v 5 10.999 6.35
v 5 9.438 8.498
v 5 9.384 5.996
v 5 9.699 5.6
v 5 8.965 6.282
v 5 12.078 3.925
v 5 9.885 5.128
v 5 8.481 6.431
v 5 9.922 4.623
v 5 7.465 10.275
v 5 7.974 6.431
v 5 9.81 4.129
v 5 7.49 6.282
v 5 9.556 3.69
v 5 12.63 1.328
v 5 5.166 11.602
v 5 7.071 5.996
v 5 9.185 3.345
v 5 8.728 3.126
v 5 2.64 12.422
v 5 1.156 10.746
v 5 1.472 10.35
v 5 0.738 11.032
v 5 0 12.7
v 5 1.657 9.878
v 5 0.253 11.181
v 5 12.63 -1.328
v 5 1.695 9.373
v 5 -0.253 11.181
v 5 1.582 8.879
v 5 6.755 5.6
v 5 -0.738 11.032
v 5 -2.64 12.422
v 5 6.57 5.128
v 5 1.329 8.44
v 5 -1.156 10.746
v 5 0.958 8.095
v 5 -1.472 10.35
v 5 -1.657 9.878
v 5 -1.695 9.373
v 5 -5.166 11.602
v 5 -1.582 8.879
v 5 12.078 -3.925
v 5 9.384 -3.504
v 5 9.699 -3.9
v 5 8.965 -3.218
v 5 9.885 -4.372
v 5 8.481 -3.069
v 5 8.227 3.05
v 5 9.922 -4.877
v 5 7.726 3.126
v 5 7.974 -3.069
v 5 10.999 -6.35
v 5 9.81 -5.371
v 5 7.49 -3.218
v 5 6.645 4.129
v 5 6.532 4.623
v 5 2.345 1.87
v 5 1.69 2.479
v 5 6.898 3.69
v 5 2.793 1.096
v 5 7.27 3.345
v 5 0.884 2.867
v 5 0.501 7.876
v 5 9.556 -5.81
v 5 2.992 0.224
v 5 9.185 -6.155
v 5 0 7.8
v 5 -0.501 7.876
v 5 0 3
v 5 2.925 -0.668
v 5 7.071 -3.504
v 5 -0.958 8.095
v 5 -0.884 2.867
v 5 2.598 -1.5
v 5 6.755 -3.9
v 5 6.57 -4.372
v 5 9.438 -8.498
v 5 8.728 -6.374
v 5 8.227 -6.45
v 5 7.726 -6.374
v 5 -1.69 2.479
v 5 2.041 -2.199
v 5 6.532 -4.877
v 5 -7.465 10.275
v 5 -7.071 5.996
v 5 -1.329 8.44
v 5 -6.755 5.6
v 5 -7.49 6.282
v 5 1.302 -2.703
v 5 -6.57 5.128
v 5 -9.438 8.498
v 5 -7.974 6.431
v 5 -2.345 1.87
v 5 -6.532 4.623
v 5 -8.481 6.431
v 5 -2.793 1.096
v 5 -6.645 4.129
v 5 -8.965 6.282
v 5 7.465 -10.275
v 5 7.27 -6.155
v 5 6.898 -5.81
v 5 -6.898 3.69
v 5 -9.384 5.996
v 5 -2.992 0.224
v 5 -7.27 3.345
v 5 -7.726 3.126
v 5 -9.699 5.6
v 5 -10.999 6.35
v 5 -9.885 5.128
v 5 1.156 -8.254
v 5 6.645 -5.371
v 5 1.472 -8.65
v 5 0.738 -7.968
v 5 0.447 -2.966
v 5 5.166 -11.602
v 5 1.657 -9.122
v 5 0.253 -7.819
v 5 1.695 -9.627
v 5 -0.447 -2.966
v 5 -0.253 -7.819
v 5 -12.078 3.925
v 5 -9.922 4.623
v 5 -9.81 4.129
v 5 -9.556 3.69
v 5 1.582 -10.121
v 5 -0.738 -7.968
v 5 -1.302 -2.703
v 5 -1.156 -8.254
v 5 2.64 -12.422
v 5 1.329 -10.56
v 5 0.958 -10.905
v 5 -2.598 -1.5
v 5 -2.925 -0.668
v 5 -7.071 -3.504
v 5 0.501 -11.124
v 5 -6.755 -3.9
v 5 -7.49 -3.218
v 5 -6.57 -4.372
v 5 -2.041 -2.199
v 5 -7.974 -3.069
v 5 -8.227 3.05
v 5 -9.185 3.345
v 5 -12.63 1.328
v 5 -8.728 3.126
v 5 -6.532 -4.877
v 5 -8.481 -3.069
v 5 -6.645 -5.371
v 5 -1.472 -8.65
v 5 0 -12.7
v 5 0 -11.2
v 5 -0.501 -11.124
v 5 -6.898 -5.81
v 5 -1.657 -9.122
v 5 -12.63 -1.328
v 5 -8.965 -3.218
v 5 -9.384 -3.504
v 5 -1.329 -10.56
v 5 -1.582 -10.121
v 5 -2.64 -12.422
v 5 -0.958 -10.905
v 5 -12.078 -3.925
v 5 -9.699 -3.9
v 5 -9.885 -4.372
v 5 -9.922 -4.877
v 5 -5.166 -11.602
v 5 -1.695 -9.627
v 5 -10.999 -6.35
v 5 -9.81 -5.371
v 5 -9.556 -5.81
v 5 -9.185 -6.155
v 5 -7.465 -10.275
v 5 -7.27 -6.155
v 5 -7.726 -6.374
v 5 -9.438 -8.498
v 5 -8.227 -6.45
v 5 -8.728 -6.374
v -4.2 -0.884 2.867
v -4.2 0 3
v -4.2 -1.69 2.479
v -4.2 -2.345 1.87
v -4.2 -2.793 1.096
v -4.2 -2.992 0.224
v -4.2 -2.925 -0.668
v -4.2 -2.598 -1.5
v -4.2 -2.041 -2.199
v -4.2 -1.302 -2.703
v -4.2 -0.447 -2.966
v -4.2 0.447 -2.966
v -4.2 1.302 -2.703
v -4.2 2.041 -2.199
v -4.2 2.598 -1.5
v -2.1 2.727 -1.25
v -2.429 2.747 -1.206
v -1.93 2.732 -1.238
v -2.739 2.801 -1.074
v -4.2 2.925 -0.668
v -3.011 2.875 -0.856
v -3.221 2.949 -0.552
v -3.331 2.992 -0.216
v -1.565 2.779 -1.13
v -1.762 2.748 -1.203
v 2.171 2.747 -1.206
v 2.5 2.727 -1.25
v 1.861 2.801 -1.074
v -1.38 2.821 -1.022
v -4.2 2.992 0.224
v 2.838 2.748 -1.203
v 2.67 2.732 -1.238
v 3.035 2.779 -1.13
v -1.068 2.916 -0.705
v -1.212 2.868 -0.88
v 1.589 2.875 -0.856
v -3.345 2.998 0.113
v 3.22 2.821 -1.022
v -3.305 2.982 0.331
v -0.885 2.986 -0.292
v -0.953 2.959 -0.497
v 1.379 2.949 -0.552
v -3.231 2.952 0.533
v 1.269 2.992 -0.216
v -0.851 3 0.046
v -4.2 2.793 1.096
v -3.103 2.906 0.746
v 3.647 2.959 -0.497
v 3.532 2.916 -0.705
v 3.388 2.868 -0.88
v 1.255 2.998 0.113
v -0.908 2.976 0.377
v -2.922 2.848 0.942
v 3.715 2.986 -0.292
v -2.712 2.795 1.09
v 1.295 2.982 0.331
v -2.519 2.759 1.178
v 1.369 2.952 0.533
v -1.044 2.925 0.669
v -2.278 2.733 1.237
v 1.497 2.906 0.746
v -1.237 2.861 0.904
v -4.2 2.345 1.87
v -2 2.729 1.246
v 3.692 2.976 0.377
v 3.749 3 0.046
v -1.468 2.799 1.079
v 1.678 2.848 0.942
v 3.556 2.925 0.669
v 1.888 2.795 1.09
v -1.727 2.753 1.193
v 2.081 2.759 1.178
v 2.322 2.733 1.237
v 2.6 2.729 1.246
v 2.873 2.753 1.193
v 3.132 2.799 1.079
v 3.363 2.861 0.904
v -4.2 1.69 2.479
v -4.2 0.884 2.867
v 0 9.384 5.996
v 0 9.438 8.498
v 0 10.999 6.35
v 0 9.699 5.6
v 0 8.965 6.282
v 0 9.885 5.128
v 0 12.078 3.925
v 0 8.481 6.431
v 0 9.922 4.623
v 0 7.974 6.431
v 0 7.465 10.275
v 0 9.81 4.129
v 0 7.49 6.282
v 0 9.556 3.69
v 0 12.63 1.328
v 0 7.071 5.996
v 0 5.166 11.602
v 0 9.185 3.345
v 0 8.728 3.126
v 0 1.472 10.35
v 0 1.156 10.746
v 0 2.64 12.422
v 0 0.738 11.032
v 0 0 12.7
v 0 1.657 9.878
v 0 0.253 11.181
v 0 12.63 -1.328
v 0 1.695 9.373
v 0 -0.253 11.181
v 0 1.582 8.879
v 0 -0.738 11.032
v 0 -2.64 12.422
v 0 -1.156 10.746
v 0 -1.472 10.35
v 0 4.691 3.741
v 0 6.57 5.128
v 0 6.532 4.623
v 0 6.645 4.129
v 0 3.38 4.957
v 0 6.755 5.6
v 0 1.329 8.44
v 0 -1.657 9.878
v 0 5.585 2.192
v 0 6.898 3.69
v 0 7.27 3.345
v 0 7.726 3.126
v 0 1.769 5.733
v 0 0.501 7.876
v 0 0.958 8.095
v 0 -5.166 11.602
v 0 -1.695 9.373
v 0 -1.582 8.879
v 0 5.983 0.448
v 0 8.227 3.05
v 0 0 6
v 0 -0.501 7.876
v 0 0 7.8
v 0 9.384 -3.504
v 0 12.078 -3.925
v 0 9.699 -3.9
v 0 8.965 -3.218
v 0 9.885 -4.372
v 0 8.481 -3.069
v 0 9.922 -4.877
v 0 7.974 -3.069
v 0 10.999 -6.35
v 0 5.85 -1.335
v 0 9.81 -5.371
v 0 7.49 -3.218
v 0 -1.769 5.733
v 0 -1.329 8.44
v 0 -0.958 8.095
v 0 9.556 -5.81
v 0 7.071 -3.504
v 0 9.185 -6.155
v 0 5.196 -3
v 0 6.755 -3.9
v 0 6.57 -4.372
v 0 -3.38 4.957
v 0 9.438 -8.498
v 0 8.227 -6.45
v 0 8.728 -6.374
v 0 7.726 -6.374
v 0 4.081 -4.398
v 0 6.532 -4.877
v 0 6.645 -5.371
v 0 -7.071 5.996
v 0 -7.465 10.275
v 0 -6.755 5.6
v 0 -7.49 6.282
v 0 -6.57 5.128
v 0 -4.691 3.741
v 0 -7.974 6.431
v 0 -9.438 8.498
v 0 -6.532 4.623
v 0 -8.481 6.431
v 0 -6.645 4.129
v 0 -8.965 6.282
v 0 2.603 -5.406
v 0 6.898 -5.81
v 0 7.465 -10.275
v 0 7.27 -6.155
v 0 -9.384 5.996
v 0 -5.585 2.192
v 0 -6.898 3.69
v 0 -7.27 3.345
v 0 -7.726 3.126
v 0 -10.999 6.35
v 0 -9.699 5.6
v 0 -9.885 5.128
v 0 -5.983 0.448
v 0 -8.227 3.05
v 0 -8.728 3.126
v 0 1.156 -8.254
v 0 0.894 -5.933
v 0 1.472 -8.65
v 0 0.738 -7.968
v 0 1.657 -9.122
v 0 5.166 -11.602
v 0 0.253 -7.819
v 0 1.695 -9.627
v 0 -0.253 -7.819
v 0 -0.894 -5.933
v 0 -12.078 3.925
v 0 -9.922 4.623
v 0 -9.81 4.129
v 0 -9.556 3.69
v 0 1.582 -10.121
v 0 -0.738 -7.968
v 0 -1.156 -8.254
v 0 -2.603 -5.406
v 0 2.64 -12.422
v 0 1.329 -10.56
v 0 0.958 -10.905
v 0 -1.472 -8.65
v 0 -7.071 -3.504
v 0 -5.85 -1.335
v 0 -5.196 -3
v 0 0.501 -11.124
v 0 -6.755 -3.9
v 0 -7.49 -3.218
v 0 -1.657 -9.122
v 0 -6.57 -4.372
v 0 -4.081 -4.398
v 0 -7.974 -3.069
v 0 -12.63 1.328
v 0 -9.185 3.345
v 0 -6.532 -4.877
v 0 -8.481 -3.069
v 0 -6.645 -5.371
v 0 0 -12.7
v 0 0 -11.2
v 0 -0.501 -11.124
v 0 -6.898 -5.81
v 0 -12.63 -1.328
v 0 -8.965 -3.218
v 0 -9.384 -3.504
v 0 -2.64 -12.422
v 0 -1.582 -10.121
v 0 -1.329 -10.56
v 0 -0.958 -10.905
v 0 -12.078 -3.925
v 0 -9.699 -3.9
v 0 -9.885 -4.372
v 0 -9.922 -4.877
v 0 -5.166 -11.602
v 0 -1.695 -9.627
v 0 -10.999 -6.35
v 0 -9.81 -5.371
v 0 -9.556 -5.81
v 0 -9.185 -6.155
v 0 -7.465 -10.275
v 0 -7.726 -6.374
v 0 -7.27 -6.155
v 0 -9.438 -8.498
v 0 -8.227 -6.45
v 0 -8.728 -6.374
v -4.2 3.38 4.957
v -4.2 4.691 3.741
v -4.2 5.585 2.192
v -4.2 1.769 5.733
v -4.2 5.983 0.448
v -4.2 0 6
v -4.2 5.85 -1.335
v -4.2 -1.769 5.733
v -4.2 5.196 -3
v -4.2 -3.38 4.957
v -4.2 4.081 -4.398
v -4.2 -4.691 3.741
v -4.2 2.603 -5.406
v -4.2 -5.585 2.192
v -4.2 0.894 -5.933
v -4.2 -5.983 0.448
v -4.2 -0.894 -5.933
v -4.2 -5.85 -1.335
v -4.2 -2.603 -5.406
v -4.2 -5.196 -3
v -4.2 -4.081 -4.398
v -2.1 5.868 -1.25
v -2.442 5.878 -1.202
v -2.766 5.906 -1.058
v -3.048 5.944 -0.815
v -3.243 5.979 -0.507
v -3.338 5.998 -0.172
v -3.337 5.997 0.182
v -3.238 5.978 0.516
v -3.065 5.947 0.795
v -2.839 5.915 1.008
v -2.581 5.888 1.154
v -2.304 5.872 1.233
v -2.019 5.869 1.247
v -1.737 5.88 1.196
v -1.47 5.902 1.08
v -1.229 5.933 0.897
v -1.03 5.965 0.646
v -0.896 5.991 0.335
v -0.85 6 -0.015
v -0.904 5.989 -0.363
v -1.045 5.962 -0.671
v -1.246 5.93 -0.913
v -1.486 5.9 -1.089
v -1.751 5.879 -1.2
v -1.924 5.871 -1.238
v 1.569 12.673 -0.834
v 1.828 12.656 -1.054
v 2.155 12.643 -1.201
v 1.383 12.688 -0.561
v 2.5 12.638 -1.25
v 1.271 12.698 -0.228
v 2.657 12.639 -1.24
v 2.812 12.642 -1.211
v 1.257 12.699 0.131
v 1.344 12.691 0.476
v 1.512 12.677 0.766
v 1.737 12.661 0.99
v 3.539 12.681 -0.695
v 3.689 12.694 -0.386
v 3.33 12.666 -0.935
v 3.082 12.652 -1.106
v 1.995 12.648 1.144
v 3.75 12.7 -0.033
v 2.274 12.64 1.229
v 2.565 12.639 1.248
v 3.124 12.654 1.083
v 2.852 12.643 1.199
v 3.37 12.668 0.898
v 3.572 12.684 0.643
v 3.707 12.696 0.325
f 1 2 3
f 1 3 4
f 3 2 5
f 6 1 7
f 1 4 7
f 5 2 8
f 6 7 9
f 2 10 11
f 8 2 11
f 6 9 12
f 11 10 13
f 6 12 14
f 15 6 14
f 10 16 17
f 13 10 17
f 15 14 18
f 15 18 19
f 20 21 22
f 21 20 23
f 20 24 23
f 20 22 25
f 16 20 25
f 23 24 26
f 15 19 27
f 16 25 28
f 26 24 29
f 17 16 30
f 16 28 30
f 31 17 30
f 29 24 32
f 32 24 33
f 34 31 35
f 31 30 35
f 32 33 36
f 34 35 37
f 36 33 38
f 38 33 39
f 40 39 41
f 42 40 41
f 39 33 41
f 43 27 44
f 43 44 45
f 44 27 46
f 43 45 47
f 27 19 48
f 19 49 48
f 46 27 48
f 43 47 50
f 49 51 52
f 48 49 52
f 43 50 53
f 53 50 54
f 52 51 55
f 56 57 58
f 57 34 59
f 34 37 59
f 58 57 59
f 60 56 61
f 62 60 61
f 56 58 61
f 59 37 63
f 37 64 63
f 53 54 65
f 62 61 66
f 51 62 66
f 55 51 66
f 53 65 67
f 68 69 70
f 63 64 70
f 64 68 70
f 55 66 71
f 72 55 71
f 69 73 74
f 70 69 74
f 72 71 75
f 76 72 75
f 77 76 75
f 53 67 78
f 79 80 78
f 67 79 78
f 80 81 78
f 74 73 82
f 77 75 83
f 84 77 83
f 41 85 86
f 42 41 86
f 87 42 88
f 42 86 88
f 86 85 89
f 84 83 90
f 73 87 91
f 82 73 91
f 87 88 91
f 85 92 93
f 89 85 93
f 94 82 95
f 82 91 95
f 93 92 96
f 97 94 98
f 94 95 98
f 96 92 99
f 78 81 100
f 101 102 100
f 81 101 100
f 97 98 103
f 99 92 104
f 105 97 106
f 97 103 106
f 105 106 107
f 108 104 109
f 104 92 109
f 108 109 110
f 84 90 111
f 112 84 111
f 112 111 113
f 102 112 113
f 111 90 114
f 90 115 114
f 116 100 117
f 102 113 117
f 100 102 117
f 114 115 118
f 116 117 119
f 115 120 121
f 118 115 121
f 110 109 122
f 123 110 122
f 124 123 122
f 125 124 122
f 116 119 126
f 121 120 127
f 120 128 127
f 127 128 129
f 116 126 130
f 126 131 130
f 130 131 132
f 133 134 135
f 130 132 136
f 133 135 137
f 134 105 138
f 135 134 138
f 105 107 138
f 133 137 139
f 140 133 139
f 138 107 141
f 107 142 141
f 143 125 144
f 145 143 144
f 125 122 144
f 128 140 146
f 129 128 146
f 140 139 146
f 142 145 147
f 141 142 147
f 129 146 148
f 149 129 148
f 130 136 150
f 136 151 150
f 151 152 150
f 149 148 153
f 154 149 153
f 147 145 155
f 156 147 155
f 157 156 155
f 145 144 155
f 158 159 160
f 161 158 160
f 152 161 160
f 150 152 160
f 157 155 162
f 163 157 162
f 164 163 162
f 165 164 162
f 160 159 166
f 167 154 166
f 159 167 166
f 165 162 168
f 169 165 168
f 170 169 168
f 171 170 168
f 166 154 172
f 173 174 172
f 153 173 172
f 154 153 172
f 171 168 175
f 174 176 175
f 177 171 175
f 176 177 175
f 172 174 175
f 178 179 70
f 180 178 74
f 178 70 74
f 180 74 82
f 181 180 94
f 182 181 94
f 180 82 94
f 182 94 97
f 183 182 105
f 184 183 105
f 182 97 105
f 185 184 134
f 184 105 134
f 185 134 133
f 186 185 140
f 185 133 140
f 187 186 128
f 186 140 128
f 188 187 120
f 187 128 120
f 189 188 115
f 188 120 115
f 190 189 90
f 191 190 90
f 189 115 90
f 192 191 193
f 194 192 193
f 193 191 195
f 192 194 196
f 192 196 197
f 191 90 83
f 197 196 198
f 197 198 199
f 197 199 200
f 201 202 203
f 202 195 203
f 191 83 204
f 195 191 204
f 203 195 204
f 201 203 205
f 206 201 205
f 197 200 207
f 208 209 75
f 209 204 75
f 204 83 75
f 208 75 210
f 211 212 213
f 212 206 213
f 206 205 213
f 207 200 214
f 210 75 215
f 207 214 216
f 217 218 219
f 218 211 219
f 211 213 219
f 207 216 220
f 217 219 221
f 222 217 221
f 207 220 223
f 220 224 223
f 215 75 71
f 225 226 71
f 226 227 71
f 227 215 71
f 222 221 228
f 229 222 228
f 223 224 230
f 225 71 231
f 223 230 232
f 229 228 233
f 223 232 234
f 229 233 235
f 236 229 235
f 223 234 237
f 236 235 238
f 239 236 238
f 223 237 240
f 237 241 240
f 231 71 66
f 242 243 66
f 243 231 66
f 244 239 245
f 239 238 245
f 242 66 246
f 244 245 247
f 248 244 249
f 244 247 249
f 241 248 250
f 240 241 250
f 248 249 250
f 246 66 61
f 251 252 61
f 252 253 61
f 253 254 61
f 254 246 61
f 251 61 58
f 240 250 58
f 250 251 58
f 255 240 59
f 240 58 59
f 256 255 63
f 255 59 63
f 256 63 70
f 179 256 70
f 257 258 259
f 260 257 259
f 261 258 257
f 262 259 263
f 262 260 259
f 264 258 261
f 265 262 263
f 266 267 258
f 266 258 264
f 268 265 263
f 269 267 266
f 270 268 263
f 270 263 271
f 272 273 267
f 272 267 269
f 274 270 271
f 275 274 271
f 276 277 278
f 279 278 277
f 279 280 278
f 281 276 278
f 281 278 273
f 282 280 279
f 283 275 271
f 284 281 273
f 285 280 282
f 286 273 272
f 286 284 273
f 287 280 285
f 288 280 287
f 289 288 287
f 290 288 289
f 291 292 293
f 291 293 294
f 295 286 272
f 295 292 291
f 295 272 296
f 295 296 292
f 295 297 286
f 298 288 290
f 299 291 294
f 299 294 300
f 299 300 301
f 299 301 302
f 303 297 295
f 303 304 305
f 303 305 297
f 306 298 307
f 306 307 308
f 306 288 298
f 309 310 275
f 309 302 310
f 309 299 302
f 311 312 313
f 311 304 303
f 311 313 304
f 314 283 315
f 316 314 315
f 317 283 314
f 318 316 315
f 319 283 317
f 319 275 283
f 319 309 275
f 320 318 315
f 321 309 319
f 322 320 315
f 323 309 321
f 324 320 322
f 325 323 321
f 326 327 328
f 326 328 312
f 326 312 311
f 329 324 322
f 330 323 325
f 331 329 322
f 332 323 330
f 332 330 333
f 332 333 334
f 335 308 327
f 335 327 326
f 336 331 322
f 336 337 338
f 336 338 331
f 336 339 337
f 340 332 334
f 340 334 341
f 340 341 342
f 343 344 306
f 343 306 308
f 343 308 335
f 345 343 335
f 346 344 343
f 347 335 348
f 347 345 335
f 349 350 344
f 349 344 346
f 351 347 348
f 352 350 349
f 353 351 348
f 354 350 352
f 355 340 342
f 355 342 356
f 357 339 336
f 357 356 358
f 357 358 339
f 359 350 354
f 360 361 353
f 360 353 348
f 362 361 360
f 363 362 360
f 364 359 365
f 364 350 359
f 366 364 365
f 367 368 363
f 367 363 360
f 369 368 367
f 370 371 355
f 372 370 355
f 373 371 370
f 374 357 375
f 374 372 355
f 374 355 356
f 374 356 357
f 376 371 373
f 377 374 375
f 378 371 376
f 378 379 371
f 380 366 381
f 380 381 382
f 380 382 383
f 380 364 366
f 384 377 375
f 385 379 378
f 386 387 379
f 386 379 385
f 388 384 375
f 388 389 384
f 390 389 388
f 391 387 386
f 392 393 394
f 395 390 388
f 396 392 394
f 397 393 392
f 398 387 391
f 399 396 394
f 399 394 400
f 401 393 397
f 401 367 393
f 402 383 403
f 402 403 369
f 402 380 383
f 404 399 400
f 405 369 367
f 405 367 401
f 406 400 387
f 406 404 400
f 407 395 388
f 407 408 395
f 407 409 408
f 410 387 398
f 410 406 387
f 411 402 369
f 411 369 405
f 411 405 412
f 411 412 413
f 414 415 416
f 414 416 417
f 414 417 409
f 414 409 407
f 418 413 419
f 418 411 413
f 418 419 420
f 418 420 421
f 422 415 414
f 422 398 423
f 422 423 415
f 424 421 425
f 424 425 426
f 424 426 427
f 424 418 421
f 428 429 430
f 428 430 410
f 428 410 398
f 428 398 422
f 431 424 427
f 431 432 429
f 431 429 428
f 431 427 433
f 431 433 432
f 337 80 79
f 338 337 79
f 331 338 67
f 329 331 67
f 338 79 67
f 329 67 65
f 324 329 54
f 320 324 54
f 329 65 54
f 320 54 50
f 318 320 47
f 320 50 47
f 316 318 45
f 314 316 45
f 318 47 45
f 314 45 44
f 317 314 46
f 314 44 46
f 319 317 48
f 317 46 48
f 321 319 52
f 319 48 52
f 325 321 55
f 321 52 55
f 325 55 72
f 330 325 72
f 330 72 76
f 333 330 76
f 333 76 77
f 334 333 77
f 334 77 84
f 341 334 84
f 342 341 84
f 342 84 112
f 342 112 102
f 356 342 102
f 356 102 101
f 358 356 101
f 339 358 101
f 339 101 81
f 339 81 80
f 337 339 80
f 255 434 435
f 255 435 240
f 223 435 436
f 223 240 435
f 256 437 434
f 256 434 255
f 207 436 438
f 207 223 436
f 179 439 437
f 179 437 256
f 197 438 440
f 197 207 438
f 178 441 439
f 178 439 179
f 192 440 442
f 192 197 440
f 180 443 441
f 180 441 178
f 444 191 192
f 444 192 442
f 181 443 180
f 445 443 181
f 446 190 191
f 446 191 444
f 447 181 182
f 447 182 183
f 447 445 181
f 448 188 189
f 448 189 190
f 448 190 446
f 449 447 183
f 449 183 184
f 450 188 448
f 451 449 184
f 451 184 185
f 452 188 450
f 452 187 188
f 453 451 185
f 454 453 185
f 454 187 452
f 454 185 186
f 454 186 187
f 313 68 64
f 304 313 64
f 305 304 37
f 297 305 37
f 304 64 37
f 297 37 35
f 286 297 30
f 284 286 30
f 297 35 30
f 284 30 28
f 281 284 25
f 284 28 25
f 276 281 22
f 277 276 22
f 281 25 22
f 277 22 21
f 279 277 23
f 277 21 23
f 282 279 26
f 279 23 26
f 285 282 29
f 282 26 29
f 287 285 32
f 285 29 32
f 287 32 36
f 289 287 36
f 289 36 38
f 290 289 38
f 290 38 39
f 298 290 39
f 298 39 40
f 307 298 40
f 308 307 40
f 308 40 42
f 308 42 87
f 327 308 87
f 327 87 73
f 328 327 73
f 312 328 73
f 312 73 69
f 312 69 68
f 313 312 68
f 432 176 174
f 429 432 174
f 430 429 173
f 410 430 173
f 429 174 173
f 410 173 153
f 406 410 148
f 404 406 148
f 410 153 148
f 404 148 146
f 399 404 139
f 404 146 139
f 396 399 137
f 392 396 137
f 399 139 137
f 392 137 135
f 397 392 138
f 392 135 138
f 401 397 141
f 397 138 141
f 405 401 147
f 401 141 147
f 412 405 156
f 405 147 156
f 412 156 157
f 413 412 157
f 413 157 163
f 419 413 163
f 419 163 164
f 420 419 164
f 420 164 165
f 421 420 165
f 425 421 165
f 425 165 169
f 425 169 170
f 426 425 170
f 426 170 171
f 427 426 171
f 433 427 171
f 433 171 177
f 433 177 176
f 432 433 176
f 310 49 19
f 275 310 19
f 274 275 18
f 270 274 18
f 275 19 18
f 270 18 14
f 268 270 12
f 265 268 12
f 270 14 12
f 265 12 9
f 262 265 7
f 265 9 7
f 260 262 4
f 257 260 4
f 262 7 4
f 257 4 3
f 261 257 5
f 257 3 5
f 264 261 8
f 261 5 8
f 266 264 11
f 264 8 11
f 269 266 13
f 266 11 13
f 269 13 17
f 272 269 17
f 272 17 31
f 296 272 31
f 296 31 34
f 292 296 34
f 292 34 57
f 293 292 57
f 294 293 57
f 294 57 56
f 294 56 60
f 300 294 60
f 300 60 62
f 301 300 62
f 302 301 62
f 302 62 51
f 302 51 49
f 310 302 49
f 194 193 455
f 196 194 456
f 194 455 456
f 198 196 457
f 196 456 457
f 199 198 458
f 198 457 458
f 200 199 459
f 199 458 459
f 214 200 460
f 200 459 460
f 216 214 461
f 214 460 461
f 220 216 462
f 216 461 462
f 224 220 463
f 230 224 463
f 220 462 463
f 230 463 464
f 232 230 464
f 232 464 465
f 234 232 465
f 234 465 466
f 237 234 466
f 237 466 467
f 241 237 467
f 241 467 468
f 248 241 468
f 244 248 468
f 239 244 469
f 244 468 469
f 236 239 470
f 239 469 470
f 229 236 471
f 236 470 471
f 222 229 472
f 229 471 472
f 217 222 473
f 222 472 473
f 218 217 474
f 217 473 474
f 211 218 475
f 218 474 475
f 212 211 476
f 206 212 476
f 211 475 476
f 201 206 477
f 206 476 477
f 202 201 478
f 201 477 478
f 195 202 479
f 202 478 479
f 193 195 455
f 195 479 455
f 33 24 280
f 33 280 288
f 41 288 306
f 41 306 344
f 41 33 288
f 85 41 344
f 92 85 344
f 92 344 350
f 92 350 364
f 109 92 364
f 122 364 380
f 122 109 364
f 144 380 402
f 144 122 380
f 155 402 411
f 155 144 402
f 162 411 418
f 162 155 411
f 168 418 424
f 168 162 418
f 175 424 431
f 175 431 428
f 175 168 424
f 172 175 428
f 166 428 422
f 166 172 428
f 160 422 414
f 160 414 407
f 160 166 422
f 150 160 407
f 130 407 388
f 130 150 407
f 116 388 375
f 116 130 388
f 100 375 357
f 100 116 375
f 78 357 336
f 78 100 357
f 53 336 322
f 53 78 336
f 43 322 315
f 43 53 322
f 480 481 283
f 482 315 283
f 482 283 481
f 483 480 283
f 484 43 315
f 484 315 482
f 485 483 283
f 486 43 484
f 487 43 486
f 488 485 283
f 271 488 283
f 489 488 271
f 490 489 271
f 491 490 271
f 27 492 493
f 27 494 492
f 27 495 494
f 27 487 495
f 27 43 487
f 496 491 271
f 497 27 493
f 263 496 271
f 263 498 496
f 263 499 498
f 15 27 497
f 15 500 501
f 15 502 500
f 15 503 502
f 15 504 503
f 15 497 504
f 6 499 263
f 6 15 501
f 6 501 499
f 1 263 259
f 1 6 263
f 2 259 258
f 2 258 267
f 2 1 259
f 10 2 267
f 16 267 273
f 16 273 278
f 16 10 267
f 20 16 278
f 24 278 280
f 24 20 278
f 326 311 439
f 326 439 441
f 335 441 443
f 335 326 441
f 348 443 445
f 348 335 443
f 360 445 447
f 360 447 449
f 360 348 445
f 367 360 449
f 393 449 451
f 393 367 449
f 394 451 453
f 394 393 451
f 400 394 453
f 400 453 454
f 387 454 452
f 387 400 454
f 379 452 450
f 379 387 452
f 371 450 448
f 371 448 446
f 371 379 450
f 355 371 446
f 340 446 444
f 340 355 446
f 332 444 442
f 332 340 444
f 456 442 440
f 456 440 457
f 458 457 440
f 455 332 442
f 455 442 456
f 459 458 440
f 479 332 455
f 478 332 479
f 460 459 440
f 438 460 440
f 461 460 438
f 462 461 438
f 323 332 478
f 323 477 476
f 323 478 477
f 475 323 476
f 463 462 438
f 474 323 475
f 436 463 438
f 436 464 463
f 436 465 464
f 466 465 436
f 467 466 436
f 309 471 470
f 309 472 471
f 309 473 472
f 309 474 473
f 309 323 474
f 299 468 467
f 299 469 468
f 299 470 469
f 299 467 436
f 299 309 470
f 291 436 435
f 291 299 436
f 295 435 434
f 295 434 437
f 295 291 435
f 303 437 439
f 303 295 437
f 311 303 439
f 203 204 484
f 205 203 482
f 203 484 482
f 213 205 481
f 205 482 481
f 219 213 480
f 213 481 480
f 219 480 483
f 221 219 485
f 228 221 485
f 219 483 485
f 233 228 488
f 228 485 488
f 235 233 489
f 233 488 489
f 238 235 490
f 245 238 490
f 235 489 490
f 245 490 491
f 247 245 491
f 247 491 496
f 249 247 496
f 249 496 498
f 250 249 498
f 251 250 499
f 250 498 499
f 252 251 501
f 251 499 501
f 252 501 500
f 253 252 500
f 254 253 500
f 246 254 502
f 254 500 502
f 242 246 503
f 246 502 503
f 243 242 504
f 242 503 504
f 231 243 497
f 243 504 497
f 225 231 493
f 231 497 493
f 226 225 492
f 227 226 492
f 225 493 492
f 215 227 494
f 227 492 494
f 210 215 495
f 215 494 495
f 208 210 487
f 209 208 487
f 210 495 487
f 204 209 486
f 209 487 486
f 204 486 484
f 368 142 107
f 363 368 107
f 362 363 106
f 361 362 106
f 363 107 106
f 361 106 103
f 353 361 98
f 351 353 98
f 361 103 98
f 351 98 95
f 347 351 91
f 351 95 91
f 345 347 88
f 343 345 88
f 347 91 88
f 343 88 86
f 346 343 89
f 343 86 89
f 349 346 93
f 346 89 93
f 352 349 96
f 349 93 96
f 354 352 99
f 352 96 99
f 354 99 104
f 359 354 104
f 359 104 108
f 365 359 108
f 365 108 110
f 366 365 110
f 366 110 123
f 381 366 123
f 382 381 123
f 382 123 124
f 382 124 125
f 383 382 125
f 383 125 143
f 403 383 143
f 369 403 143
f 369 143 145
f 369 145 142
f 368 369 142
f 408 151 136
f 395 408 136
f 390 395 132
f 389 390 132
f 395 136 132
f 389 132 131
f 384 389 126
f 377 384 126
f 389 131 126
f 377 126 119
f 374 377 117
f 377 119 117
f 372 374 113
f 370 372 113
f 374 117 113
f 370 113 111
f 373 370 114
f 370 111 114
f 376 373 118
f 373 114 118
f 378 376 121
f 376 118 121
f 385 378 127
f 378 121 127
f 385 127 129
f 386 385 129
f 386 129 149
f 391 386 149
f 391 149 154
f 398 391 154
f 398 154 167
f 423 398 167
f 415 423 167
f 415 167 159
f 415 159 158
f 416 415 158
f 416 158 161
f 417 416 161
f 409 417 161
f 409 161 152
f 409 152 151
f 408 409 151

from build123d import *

# Parameters (mm, degrees)
ESQUISSE1_W                                  = 4.2
ESQUISSE1_H                                  = 3
ESQUISSE1_W_2                                = 5
ESQUISSE1_H_2                                = 9.7
D_GAGEMENT_M31_D                             = 3.4
ESQUISSE4_W                                  = 1.25
ESQUISSE4_H                                  = 12.7
TROU_POUR_TARAUDAGE_POUR_TROU_TARAUD_2_COUNT = 2
TROU_POUR_TARAUDAGE_POUR_TROU_TARAUD_2_PITCH = 4.6


with BuildPart() as part:
    # Esquisse1 → Révolution1 (revolve)
    with BuildSketch(Plane.XY, mode=Mode.PRIVATE) as r_volution1_sk:
        with Locations((-2.1, 4.5)):
            Rectangle(ESQUISSE1_W, ESQUISSE1_H)
        with Locations((2.5, 7.85)):
            Rectangle(ESQUISSE1_W_2, ESQUISSE1_H_2)
    revolve(r_volution1_sk.sketch.rotate(Axis((0, 0, 0), (1, 0, 0)), 90), axis=Axis((0, 0, 0), (1, 0, 0)))

    # Dégagement M31 (through all)
    with Locations(Plane.ZY):
        with Locations((4.75, 8.227241336), (-4.75, 8.227241336), (-9.5, 0), (-4.75, -8.227241336), (4.75, -8.227241336), (9.5, 0)):
            Hole(D_GAGEMENT_M31_D / 2)

    # Esquisse4 → Trou pour taraudage pour trou taraudé M3x0.51 (revolve, cut)
    with BuildSketch(Plane(origin=(2.5, 0, 0), x_dir=(0, 0, -1), z_dir=(1, 0, 0))):
        with Locations((0.625, 6.35)):
            Rectangle(ESQUISSE4_W, ESQUISSE4_H)
    trou_pour_taraudage_pour_trou_taraud_m3 = revolve(axis=Axis((2.5, -6.35, 0), (0, 1, 0)), mode=Mode.SUBTRACT)

    # Trou pour taraudage pour trou taraud 2: Trou pour taraudage pour trou taraudé M3x0.51 ×2
    with Locations(*[(-i * TROU_POUR_TARAUDAGE_POUR_TROU_TARAUD_2_PITCH, 0, 0) for i in range(1, TROU_POUR_TARAUDAGE_POUR_TROU_TARAUD_2_COUNT)]):
        add(trou_pour_taraudage_pour_trou_taraud_m3, mode=Mode.SUBTRACT)


solid = part.part
